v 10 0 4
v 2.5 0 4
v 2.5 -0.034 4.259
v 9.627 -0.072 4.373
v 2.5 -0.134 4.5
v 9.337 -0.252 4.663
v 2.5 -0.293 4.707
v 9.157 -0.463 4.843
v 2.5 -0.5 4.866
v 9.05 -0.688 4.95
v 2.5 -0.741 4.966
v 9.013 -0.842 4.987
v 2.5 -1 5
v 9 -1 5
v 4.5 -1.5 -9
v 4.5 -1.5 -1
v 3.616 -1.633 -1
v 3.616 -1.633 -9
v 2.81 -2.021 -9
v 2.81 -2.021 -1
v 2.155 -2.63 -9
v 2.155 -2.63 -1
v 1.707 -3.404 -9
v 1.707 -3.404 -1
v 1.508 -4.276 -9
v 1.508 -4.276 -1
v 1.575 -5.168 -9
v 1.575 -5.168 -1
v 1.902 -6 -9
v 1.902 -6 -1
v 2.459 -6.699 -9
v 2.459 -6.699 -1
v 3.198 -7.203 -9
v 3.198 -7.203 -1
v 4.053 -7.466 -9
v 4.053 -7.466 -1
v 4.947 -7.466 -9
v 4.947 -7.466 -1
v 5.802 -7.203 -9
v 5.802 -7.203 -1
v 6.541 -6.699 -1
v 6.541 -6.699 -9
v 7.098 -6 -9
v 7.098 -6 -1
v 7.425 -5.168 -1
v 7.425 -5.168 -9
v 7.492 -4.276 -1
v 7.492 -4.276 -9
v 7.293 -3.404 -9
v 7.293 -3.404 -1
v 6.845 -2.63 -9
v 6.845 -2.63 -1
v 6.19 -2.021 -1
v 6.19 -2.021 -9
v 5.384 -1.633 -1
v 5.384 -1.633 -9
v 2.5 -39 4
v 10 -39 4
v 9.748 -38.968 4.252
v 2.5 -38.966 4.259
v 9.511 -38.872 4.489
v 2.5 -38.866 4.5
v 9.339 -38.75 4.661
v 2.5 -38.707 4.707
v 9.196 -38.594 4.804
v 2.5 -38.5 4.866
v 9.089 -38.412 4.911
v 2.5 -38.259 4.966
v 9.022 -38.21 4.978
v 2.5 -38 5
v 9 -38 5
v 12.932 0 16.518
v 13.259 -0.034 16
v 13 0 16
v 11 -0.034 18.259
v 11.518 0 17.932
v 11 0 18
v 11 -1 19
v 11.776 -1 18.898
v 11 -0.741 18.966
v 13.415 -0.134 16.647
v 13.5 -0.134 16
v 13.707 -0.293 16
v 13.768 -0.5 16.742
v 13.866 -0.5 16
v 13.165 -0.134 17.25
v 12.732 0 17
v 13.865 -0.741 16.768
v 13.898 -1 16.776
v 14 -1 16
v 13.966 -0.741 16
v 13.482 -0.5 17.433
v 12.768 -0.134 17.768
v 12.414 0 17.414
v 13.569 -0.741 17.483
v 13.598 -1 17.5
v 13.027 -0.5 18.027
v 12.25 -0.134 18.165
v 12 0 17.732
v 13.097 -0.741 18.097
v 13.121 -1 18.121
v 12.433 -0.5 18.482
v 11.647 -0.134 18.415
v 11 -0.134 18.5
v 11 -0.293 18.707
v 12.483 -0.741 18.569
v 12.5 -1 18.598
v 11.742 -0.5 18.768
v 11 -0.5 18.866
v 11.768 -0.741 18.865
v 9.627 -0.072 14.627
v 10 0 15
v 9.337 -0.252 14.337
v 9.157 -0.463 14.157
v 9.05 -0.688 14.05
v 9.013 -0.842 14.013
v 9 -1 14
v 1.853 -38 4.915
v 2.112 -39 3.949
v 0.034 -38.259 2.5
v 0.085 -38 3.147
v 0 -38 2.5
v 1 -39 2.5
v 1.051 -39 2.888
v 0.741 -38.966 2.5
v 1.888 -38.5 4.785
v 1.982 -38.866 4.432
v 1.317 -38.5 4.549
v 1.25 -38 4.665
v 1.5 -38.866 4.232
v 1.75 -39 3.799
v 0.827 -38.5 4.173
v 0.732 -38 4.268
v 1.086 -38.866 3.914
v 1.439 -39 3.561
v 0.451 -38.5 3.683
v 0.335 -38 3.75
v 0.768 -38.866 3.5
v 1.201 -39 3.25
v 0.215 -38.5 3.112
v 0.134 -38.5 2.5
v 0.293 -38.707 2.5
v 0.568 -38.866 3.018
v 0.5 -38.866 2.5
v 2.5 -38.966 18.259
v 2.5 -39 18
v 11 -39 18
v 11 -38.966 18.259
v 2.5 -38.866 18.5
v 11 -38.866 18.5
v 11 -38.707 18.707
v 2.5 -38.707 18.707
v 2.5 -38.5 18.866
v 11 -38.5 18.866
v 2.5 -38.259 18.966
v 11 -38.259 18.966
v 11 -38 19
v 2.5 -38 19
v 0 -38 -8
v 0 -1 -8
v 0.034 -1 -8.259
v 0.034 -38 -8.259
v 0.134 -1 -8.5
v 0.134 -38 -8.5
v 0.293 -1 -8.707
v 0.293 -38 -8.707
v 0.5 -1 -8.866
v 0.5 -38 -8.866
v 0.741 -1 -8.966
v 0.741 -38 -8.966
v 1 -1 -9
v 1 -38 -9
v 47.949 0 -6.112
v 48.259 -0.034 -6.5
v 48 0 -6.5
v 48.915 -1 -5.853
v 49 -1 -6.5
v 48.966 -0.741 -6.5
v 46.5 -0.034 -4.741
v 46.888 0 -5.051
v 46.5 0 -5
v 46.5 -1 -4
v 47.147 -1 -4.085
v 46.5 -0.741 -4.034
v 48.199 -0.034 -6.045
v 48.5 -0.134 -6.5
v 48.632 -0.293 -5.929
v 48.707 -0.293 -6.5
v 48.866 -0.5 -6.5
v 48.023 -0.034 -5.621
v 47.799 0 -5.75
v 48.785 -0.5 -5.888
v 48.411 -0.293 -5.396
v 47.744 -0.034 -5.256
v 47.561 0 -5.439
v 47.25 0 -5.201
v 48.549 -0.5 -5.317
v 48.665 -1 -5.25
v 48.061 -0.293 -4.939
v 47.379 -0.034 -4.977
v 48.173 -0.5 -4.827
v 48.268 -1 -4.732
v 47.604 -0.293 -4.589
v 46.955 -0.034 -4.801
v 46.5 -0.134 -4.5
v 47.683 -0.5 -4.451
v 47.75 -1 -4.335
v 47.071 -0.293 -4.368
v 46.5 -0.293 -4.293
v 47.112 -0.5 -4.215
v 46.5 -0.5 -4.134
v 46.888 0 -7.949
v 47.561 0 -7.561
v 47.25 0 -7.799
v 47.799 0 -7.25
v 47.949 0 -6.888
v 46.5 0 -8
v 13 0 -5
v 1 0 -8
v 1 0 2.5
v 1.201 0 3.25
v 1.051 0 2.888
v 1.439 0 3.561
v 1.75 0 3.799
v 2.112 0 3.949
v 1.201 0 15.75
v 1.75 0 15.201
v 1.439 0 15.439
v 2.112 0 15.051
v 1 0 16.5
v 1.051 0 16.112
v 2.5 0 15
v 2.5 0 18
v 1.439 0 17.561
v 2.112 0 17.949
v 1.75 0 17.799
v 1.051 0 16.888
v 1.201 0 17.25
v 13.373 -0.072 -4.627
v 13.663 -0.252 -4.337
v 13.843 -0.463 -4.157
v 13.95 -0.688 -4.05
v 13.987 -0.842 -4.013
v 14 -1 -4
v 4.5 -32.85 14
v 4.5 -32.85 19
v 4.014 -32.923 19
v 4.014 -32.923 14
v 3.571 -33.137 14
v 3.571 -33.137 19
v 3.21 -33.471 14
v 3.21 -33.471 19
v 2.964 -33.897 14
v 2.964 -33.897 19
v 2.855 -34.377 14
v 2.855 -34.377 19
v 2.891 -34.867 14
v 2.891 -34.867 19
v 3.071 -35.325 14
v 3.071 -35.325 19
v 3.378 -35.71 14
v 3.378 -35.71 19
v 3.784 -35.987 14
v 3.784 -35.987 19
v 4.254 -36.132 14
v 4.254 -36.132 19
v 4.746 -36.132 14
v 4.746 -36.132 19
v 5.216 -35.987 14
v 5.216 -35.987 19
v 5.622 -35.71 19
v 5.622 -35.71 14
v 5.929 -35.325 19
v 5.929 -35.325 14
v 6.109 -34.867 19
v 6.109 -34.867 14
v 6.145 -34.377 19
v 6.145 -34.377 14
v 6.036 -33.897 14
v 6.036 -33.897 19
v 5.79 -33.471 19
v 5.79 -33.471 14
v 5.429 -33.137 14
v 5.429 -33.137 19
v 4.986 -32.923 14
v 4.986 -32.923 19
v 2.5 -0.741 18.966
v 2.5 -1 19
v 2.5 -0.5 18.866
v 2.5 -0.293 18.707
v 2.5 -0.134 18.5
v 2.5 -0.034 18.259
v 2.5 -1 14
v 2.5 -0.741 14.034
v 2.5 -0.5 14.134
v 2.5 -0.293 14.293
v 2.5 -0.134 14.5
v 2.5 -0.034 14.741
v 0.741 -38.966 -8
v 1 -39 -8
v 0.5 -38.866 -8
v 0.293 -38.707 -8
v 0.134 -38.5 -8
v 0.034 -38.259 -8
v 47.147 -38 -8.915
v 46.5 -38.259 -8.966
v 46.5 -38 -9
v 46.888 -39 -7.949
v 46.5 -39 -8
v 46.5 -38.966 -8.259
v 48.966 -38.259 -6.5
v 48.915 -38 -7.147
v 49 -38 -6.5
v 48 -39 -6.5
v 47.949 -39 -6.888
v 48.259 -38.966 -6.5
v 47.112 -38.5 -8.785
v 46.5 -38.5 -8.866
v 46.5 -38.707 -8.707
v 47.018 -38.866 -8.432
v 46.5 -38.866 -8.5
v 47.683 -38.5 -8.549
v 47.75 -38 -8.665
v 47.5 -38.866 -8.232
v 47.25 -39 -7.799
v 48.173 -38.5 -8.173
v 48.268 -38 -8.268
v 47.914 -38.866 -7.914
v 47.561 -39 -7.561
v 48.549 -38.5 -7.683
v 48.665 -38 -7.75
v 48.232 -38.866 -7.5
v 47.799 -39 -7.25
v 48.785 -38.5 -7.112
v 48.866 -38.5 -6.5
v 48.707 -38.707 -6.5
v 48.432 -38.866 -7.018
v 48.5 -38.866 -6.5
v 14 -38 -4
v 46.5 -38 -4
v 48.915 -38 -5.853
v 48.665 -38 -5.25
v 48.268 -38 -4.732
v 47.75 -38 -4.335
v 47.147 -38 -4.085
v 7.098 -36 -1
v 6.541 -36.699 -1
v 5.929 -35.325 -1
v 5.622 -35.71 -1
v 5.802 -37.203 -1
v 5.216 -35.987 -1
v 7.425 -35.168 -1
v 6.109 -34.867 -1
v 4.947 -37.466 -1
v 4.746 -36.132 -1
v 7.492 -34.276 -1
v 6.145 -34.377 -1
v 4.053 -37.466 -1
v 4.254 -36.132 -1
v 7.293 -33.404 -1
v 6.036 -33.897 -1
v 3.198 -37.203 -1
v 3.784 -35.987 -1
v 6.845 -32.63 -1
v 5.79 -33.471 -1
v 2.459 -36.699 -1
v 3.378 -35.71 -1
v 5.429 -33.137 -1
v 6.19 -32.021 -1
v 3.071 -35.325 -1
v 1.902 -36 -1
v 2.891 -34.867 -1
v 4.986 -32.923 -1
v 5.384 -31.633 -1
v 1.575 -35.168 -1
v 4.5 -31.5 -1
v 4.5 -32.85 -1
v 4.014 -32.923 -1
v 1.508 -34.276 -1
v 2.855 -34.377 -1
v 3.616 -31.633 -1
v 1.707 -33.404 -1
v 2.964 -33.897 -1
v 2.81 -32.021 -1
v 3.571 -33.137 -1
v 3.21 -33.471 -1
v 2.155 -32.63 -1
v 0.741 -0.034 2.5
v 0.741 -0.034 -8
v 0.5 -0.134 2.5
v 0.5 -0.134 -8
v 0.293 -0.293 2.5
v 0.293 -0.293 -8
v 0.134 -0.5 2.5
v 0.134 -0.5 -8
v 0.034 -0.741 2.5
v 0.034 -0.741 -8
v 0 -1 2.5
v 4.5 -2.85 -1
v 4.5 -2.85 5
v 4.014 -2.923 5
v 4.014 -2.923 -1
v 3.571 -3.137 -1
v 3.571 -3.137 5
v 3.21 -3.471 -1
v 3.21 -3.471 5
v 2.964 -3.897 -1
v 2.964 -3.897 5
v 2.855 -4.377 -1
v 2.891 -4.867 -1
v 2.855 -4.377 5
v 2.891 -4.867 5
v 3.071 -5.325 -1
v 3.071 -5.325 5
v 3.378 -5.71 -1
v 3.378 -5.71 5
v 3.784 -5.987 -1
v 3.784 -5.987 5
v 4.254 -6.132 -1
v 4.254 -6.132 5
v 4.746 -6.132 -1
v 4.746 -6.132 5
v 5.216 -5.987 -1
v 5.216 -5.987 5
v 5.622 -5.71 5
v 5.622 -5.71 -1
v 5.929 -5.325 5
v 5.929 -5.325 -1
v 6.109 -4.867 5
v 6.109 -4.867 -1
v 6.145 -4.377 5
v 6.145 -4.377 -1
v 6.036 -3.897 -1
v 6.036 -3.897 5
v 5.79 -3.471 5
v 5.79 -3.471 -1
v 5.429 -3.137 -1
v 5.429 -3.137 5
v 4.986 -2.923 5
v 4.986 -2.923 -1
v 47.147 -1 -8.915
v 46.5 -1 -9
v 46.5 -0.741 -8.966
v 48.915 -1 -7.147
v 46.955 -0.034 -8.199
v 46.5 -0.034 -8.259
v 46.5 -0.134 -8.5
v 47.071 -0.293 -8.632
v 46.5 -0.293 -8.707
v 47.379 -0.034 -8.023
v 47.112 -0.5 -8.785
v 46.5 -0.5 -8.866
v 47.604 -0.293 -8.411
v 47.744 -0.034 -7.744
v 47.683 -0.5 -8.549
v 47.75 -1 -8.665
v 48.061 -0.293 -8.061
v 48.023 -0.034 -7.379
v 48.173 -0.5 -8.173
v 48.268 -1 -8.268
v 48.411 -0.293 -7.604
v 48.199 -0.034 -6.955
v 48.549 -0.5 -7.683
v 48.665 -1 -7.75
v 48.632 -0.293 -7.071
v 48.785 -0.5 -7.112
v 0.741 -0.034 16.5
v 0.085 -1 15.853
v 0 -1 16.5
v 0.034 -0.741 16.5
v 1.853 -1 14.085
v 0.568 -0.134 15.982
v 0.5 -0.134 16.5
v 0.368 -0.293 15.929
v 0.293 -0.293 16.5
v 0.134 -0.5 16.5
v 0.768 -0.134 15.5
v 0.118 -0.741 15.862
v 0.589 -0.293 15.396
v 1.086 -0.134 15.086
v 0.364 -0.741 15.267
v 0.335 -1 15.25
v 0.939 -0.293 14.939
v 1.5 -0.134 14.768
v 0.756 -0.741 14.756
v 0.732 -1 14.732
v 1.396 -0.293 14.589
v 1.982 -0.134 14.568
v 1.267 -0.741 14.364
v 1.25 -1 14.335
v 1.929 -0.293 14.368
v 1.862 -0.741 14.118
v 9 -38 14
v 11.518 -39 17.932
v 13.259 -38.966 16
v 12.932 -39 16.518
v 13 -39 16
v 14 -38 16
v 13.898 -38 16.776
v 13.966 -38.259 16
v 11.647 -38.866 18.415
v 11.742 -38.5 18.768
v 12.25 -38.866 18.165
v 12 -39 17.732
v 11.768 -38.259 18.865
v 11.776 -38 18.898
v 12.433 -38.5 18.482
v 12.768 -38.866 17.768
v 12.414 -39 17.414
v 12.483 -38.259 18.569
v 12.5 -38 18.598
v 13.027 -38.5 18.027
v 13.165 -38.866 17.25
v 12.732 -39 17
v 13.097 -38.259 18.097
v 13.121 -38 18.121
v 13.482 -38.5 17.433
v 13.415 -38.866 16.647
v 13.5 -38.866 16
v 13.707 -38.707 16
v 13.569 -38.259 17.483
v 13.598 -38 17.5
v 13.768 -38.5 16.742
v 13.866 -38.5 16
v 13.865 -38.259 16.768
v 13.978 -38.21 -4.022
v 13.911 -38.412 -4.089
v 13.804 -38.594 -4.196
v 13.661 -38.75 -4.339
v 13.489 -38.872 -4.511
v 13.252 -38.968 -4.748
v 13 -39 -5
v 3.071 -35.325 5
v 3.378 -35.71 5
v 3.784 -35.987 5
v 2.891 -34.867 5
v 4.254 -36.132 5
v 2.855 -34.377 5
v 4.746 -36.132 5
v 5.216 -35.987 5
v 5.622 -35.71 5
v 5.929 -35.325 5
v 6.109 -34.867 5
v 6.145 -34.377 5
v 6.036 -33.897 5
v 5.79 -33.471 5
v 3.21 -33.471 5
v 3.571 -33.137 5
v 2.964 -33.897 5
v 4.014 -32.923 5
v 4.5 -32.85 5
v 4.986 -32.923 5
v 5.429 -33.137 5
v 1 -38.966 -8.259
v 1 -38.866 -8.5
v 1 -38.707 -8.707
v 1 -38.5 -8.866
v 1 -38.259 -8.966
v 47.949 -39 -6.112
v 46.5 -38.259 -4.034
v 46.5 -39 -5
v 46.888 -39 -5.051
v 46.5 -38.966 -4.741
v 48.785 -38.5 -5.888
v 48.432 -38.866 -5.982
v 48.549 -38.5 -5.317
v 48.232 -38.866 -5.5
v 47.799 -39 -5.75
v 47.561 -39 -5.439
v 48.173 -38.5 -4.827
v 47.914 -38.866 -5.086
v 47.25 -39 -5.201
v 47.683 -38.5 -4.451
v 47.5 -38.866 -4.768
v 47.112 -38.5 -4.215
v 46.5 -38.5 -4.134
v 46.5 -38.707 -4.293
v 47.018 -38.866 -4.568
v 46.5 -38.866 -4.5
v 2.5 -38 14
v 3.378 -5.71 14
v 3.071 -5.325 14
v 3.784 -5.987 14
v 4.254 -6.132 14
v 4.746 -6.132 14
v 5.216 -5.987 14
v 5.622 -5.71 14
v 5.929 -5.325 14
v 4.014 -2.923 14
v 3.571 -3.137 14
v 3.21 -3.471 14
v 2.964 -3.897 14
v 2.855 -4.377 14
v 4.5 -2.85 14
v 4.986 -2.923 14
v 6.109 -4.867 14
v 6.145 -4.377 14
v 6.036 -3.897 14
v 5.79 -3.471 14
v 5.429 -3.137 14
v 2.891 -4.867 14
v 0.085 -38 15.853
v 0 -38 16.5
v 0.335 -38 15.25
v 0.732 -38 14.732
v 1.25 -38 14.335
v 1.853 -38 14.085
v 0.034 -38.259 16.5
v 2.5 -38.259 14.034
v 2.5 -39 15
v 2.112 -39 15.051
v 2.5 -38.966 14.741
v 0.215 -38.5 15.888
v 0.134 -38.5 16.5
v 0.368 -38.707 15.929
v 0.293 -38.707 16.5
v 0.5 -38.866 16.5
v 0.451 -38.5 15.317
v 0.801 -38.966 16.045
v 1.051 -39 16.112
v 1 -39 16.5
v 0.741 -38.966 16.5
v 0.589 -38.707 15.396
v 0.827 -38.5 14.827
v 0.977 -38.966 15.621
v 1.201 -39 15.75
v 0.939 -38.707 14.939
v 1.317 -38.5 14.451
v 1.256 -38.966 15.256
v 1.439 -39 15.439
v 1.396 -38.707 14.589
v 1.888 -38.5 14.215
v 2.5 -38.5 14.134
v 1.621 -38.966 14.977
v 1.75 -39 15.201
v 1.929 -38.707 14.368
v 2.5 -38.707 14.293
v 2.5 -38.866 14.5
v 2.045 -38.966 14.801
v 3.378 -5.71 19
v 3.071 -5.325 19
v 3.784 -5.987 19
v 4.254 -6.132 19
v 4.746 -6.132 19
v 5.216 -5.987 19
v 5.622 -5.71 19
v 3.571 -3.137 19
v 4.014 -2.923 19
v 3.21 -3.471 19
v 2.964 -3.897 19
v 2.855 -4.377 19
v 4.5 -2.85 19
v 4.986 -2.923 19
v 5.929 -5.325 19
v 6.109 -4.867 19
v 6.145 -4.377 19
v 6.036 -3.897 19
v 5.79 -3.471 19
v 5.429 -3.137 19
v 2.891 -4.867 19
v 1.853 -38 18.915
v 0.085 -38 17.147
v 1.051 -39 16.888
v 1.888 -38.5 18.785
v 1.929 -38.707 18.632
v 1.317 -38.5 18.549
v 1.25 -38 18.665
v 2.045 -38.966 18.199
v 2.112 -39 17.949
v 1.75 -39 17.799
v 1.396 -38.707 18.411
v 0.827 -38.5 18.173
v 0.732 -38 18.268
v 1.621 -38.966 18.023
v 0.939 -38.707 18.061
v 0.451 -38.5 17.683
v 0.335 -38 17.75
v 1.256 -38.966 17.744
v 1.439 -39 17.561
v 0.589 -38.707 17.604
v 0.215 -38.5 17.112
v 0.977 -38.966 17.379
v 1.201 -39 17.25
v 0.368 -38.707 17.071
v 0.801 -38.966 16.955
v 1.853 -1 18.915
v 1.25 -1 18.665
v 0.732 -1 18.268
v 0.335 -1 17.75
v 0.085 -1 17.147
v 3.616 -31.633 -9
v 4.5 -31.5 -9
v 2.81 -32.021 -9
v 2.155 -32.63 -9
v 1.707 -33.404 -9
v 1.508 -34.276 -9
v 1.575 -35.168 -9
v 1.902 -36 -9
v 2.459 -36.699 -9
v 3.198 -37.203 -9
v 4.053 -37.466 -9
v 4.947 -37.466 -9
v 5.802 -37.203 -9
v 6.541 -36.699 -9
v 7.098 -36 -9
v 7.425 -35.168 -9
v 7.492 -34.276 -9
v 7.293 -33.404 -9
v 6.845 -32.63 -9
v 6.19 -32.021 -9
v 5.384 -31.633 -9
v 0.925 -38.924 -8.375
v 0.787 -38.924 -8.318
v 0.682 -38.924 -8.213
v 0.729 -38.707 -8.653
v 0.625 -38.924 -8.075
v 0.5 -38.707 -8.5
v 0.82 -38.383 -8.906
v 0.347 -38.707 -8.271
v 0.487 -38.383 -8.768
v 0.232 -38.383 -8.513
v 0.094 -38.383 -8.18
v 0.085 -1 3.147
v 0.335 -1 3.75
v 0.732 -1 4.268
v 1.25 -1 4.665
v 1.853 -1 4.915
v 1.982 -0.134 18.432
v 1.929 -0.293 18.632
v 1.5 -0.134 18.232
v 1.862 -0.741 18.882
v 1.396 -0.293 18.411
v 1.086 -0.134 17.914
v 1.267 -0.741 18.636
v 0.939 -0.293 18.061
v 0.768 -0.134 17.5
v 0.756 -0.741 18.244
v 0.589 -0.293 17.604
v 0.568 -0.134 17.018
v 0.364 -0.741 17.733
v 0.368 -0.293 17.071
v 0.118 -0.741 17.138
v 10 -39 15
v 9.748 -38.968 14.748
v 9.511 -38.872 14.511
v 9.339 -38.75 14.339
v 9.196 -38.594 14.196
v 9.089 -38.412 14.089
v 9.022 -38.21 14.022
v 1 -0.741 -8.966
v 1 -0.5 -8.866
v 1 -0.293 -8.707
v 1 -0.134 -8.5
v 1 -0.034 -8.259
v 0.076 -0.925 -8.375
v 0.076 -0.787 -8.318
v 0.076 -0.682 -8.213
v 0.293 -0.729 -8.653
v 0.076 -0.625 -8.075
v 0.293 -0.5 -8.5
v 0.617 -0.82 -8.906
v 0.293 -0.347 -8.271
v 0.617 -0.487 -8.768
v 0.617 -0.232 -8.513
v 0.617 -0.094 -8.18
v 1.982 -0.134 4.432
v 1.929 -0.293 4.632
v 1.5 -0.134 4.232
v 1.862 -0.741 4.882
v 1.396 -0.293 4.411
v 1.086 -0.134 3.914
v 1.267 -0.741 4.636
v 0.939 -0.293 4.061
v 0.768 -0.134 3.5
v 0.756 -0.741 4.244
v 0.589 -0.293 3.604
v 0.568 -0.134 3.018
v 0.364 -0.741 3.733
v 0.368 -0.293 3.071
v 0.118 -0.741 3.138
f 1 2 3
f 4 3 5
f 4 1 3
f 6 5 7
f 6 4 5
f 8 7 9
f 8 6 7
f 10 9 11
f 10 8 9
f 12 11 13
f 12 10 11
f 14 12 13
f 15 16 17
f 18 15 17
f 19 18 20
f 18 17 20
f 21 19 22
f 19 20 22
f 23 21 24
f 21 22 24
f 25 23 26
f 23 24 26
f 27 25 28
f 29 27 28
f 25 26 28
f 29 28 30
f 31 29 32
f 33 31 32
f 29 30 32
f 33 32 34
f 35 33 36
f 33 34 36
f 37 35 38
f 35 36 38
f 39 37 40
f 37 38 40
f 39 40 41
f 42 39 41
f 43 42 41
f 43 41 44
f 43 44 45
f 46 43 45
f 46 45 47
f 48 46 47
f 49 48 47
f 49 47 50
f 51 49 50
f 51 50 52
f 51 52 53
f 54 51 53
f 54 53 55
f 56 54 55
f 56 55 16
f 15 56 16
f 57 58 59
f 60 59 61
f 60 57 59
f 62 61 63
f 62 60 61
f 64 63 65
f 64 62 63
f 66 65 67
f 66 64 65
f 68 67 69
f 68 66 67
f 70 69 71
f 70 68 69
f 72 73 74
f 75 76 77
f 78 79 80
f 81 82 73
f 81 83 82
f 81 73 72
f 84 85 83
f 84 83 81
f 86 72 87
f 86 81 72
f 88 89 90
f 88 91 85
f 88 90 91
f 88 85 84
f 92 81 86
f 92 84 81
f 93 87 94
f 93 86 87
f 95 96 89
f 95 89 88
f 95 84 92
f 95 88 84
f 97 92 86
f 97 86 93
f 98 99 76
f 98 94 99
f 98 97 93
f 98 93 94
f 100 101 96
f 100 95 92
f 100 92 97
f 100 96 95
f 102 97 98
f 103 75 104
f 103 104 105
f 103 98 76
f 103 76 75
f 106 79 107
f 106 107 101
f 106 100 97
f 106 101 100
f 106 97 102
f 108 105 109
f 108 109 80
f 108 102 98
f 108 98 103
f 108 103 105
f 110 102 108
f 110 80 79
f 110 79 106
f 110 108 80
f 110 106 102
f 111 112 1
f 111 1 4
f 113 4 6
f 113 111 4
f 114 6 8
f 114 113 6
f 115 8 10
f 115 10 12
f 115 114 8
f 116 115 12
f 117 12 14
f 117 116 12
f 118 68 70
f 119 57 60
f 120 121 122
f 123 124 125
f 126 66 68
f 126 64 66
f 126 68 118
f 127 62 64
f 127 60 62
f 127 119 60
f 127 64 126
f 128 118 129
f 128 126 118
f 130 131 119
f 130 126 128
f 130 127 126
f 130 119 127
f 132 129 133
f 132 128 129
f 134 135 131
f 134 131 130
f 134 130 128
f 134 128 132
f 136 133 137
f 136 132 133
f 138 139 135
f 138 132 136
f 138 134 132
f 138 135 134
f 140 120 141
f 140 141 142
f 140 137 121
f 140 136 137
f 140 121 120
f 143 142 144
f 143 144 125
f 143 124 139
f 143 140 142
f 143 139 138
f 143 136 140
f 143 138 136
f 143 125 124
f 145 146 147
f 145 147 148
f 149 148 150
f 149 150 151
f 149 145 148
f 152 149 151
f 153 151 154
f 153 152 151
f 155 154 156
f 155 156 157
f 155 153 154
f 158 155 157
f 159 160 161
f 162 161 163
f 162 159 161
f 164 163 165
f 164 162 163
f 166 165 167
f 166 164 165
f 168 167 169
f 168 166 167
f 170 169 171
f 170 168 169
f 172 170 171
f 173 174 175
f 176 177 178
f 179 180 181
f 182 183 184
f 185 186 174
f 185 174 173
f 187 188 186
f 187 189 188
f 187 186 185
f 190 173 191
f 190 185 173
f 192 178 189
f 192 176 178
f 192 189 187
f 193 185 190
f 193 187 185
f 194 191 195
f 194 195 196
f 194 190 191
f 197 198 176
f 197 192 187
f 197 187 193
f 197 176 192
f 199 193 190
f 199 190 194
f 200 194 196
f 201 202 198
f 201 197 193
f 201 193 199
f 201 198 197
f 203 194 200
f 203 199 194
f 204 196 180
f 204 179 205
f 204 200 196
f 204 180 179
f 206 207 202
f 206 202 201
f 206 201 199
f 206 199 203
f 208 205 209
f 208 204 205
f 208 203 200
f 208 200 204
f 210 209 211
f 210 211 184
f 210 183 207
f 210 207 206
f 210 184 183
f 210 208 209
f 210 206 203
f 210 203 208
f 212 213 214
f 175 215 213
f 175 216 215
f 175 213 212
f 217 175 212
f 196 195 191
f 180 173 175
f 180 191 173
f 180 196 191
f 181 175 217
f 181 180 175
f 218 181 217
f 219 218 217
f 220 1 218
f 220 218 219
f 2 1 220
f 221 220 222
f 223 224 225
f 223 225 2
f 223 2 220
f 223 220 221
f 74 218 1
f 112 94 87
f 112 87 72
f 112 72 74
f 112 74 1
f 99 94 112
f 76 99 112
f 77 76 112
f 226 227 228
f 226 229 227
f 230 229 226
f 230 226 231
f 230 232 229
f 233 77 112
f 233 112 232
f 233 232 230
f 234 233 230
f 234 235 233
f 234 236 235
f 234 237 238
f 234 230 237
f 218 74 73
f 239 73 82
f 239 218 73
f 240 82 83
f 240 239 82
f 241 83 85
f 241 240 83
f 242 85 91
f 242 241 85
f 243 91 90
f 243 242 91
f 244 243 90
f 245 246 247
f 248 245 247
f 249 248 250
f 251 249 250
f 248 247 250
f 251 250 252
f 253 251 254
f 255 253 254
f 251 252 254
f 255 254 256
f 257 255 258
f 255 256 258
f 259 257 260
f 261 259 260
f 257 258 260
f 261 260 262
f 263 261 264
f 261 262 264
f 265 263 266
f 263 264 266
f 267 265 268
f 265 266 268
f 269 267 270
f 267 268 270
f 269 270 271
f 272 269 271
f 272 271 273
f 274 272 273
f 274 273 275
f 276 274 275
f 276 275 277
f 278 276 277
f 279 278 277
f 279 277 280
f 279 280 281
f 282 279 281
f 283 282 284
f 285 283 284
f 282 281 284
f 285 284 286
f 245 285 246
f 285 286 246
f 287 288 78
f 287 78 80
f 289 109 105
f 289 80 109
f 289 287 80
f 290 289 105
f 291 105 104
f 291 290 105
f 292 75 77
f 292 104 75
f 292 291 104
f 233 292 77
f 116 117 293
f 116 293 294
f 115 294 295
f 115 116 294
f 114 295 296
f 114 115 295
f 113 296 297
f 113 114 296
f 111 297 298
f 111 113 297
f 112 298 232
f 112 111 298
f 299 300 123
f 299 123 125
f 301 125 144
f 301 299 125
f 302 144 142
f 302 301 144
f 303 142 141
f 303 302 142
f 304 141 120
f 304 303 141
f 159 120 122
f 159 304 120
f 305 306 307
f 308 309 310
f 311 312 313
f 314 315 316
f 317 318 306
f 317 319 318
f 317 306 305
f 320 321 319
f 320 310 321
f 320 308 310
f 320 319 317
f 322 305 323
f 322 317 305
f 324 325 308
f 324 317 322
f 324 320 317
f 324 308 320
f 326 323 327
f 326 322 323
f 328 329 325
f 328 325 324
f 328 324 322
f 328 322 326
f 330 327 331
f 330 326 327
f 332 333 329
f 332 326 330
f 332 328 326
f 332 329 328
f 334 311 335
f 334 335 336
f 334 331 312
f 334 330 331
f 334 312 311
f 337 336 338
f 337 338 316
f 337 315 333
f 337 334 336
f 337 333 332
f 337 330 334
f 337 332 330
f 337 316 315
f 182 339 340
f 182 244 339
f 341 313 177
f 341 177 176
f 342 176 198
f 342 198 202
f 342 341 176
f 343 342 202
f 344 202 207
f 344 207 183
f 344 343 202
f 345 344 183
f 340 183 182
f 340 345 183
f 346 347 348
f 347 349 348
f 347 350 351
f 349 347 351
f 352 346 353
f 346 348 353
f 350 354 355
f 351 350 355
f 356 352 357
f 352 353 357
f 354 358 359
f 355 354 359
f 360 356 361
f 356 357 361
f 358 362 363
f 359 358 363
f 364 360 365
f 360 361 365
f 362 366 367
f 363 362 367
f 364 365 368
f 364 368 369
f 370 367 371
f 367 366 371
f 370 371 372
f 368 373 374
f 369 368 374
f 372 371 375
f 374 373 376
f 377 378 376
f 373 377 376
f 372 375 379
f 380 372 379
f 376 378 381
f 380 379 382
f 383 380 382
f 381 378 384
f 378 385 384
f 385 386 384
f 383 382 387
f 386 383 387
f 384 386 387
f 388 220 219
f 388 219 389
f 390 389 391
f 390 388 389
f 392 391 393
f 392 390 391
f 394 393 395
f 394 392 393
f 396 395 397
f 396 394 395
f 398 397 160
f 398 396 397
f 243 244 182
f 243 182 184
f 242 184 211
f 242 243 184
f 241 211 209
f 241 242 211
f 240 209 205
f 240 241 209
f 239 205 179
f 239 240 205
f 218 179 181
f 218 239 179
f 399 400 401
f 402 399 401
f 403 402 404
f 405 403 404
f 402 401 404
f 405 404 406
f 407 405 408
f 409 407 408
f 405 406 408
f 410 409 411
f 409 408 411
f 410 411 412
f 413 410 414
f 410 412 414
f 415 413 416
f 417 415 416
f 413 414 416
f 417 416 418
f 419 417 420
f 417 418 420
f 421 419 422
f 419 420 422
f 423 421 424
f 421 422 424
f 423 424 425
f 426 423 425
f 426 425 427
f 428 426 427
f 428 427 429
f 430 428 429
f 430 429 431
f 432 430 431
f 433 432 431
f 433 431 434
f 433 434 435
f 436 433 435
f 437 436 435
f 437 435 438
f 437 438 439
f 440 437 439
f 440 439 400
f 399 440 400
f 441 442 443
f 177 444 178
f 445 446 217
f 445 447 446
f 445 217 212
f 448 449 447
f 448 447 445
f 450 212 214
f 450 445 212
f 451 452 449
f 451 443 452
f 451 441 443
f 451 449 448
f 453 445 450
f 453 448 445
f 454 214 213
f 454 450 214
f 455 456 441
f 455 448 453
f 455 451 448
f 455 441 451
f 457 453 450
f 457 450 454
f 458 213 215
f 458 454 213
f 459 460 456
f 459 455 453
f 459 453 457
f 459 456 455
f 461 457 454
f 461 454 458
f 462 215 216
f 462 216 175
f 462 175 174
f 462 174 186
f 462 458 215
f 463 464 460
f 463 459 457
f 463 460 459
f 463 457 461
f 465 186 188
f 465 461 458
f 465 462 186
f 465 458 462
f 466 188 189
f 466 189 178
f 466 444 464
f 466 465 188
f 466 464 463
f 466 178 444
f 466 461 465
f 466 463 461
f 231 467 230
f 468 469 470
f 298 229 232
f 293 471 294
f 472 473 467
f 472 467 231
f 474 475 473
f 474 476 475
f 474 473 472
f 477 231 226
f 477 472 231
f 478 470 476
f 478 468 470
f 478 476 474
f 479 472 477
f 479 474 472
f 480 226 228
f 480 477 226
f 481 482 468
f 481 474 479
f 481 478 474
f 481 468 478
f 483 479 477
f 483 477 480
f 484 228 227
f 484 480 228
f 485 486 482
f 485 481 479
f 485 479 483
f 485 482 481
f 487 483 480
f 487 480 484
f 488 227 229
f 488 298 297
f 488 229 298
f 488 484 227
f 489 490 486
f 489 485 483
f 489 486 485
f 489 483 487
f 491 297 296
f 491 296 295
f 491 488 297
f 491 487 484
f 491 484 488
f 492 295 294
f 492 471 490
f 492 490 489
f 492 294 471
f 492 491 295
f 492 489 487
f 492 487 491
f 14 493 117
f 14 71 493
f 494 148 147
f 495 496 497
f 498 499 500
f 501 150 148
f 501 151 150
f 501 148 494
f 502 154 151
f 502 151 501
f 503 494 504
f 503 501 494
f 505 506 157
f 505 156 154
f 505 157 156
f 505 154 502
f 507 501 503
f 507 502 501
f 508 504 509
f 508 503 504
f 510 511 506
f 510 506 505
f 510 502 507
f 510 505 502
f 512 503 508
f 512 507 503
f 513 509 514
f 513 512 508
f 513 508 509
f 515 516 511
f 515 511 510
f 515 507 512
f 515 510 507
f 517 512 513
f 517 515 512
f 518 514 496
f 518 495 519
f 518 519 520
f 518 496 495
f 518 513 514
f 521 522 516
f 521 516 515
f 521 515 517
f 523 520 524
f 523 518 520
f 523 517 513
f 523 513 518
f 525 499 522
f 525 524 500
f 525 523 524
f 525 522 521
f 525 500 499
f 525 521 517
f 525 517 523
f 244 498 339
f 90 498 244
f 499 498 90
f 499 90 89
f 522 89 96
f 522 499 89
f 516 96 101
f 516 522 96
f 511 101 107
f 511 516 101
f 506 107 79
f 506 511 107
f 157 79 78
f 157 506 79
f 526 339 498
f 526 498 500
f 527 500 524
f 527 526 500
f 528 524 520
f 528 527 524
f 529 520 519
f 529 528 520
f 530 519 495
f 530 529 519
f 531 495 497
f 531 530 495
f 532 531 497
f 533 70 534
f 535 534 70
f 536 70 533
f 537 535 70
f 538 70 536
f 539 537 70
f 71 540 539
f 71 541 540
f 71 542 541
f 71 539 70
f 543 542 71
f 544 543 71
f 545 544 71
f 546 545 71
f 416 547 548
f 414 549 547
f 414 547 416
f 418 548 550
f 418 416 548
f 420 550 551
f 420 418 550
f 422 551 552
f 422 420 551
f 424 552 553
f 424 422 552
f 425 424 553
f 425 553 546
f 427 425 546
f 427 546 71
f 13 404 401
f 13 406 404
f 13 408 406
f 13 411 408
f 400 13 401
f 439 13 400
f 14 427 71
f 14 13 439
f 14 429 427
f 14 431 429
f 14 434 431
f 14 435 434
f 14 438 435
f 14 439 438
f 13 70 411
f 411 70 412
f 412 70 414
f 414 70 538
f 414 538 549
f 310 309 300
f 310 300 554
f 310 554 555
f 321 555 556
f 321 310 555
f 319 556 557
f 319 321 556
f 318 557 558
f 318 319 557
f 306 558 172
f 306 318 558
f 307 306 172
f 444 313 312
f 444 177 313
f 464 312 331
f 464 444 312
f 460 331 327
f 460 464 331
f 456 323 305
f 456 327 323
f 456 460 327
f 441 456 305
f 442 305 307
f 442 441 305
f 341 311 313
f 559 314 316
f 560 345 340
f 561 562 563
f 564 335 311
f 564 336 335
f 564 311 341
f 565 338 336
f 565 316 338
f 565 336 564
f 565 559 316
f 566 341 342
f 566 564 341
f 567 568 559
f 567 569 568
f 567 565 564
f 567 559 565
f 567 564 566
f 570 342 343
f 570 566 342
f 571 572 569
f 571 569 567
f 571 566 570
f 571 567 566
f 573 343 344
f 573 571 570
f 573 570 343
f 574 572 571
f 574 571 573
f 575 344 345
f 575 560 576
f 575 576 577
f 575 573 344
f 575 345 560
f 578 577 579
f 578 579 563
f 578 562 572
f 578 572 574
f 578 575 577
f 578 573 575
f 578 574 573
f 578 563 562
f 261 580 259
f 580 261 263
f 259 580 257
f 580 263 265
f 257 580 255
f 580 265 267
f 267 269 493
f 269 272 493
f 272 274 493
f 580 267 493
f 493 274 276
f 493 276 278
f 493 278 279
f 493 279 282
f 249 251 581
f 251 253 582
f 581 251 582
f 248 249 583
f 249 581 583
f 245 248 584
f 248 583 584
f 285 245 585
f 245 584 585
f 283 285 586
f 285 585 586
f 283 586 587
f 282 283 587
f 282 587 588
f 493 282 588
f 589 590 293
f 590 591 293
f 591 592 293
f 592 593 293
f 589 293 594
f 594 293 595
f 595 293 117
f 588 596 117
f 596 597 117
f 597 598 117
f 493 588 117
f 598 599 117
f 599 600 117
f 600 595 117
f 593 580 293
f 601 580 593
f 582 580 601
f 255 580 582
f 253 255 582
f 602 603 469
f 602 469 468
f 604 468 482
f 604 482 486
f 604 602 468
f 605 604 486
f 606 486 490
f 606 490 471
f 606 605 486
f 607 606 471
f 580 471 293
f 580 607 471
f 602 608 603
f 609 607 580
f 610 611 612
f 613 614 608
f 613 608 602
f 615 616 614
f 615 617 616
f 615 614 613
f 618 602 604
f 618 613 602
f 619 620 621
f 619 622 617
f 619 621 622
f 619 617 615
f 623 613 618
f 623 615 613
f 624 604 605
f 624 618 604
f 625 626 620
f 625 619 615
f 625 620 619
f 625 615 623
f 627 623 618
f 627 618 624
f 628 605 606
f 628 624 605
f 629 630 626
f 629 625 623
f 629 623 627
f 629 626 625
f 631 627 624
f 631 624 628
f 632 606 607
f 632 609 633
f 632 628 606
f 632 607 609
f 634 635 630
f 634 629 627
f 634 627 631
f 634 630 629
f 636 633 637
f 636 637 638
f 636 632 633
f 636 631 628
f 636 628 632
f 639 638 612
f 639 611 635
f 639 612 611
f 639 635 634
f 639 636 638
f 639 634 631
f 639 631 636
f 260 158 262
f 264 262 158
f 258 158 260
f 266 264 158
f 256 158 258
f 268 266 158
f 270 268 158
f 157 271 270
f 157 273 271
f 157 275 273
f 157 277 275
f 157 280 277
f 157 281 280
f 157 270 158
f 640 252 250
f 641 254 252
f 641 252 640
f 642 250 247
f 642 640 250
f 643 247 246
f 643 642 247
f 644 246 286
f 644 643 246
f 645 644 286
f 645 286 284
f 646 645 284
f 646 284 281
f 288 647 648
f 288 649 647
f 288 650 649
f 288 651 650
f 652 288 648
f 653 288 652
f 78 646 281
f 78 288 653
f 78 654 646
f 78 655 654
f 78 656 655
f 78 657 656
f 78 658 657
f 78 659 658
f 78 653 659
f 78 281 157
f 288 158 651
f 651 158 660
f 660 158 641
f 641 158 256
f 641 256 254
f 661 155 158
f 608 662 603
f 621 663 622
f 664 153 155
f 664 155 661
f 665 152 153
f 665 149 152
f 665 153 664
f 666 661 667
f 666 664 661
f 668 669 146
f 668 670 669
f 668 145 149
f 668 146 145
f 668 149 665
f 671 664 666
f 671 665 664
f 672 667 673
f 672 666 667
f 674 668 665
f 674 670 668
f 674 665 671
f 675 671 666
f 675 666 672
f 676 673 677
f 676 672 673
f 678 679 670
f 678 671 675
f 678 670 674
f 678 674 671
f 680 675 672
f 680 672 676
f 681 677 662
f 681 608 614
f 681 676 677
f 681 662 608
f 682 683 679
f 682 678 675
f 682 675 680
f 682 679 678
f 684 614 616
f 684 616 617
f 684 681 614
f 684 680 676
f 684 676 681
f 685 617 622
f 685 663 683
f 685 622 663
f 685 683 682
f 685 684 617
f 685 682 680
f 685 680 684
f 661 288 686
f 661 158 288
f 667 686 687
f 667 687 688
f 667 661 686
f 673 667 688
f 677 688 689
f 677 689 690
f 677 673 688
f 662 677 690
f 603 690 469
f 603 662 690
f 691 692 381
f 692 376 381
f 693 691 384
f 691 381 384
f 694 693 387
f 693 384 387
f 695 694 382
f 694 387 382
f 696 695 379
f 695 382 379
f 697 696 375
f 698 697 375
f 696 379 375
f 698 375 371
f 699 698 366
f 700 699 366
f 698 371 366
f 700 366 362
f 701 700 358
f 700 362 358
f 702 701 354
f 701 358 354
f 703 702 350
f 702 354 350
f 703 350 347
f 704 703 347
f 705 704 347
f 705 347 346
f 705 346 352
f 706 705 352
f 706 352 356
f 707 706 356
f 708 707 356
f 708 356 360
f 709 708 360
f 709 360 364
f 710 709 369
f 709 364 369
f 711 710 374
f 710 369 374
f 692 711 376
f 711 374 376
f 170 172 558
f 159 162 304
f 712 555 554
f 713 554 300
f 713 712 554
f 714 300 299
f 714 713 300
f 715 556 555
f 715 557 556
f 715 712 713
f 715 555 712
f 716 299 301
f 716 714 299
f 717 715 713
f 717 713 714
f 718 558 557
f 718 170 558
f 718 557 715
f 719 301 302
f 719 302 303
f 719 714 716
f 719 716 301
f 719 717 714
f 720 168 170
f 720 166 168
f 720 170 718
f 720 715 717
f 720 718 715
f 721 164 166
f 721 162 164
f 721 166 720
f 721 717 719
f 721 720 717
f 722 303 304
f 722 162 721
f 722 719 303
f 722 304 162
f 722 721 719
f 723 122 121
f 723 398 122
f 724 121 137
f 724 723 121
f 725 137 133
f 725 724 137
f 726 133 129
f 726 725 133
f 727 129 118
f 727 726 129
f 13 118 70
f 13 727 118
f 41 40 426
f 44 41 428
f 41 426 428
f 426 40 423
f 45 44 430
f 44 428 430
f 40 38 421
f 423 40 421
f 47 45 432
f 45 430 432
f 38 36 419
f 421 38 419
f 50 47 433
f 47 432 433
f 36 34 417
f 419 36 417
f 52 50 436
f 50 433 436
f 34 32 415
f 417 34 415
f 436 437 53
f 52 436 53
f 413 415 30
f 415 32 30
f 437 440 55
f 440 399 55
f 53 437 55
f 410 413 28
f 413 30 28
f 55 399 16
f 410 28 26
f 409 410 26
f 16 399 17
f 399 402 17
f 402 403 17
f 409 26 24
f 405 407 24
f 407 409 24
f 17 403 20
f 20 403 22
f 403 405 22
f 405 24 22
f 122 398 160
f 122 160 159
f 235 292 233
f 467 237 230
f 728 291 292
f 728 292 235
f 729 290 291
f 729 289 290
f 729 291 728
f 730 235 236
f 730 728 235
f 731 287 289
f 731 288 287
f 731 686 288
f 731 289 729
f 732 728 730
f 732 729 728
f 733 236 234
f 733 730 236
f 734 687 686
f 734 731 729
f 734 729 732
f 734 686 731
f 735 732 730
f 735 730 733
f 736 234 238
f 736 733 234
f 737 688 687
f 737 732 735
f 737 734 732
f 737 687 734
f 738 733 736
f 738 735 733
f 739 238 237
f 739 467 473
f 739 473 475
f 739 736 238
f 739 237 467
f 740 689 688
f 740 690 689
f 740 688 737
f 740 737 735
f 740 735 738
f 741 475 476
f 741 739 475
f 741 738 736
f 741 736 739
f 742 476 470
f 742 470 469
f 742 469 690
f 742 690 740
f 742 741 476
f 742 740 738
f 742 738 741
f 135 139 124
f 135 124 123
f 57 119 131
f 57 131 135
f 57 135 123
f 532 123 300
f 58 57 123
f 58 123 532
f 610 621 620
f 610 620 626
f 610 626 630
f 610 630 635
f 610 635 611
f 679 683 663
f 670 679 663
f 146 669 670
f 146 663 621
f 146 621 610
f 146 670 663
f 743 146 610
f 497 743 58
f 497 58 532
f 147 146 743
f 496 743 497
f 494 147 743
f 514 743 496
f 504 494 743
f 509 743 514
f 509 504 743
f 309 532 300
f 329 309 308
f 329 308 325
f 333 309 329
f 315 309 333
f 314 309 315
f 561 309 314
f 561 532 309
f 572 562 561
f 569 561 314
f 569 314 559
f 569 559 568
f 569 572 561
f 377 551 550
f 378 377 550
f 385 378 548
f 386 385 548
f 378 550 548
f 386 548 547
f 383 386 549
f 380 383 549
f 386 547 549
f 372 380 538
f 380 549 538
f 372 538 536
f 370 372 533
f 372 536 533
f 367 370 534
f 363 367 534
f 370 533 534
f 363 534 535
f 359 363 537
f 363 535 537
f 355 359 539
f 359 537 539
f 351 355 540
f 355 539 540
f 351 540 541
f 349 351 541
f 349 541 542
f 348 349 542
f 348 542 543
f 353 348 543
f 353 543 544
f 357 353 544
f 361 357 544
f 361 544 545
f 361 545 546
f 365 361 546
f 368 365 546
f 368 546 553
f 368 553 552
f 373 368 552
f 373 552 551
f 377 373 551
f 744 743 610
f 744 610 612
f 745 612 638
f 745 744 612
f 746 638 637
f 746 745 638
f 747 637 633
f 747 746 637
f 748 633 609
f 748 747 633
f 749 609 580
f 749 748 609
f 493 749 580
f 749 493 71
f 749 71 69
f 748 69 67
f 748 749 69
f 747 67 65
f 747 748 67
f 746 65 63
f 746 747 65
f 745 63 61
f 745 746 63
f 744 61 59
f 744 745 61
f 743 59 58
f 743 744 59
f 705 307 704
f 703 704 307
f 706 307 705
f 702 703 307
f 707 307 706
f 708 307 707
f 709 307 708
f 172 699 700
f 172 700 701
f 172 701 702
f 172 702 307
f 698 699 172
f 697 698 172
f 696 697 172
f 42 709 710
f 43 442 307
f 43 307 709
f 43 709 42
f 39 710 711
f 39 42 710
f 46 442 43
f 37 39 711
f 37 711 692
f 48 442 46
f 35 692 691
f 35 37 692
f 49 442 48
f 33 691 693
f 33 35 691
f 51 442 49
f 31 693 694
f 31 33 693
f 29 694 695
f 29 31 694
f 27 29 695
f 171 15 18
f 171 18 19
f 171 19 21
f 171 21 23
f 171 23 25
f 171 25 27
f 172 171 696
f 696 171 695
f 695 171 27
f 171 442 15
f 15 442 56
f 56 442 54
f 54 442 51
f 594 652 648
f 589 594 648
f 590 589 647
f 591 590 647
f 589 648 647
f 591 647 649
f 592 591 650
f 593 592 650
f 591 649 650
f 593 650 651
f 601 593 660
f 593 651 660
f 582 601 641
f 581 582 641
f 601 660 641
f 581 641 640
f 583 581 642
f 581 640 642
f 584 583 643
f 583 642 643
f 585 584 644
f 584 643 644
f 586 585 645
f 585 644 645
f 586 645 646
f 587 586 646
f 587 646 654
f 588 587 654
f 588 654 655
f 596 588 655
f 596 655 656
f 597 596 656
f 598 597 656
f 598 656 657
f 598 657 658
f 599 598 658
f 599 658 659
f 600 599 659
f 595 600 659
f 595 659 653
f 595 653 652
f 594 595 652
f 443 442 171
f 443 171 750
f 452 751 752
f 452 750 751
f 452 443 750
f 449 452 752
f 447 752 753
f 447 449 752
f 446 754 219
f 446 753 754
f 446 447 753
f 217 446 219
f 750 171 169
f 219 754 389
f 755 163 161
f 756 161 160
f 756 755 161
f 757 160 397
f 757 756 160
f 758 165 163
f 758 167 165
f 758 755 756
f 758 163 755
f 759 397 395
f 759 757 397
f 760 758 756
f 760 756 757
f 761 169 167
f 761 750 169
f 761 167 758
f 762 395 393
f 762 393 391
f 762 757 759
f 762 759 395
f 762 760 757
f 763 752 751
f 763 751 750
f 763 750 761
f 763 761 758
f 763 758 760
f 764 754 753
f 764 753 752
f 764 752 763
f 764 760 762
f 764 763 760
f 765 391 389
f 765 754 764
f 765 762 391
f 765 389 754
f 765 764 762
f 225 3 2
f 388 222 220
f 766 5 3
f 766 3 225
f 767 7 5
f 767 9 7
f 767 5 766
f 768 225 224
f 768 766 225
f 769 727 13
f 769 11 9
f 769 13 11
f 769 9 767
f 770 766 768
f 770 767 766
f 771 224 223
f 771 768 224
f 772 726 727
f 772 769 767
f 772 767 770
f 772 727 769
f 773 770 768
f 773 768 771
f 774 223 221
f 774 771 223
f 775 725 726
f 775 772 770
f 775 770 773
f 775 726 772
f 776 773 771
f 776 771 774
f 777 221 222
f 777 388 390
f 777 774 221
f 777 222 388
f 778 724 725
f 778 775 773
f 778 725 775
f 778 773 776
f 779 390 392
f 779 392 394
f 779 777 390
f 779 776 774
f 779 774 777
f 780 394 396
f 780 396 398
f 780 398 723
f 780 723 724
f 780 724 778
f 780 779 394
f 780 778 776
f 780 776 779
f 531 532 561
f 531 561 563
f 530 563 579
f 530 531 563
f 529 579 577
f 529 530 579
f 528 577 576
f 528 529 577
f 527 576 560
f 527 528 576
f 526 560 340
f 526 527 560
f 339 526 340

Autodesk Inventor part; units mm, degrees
ref_plane "YZ Plane" through (0, 0, 0) normal (1, 0, 0) x (0, 1, 0)
ref_plane "XZ Plane" through (0, 0, 0) normal (0, 1, 0) x (-1, 0, 0)
ref_plane "XY Plane" through (0, 0, 0) normal (0, 0, 1) x (1, 0, 0)
sketch "スケッチ1" plane through (0, 0, 0) normal (0, 0, 1) x (1, 0, 0)
  line L0 (0, 0) -> (49, 0)
  line L1 (49, 0) -> (49, -39)
  line L2 (49, -39) -> (0, -39)
  line L3 (0, -39) -> (0, 0)
  dimension "d2" = 39
  dimension "d3" = 49
extrude "押し出し1" add sketch "スケッチ1" along normal blind 5
sketch "スケッチ2" plane through (0, 0, 5) normal (0, 0, 1) x (1, 0, 0)
  line L0 (49, 0) -> (0, 0) projected
  line L1 (9, 0) -> (14, 0)
  line L2 (14, 0) -> (14, -39)
  line L3 (14, -39) -> (9, -39)
  line L4 (9, -39) -> (9, 0)
  line L5 (0, 0) -> (0, -39) projected
  dimension "d4" = 5
  dimension "d5" = 39
  dimension "d6" = 9
extrude "押し出し2" add sketch "スケッチ2" along normal blind 9
sketch "スケッチ3" plane through (0, 0, 14) normal (0, 0, 1) x (1, 0, 0)
  line L0 (0, -39) -> (9, -39) projected
  line L1 (14, 0) -> (0, 0)
  line L2 (0, 0) -> (0, -39)
  line L3 (0, -39) -> (14, -39)
  line L4 (14, -39) -> (14, 0)
  point P0 (0, 0)
extrude "押し出し3" add sketch "スケッチ3" along normal blind 5
sketch "スケッチ4" plane through (0, 0, 0) normal (0, 0, -1) x (-1, 0, 0)
  line L0 (-49, 0) -> (-14, 0) projected
  line L1 (0, -39) -> (-49, -39) projected
  line L2 (-49, 0) -> (0, 0)
  line L3 (0, 0) -> (0, -39)
  line L4 (0, -39) -> (-49, -39)
  line L5 (-49, -39) -> (-49, 0)
  point P0 (0, 0)
extrude "押し出し4" add sketch "スケッチ4" along normal blind 9
sketch "スケッチ5" plane through (0, 0, 5) normal (0, 0, 1) x (1, 0, 0)
  line L0 (49, 0) -> (14, 0) projected
  line L1 (14, 0) -> (49, 0)
  line L2 (49, 0) -> (49, -39)
  line L3 (49, -39) -> (14, -39)
  line L4 (14, -39) -> (14, 0)
  point P0 (0, 0)
extrude "押し出し5" cut sketch "スケッチ5" against normal blind 9
fillet "フィレット1" radius 2.5 2 edges at (49, -19.5, -4) (49, -19.5, -9)
fillet "フィレット2" radius 2.5 3 edges at (0, -19.5, 19) (0, -19.5, 14) (0, -19.5, 5)
sketch "スケッチ6" plane through (0, 0, -9) normal (0, 0, -1) x (-1, 0, 0)
  line L0 (0, 0) -> (-46.5, 0) projected
  line L1 (-46.5, -39) -> (0, -39) projected
  line L2 (0, -39) -> (0, 0) projected
  point P0 (-4.5, -4.5)
  point P1 (-4.5, -34.5)
  dimension "d17" = 4.5
  dimension "d18" = 4.5
  dimension "d19" = 4.5
  dimension "d20" = 4.5
hole "穴1" at (4.5, -4.5, -9) at (4.5, -34.5, -9) direction (0, 0, 1) diameter 3.3 end through all counterbore diameter 6 counterbore depth 8
fillet "フィレット5" radius 1 23 edges at (48.2678, 0, -4.7322) (30.2501, 0, -4) (23.25, 0, -9) (0.7322, 0, 4.2678) (5.7499, 0, 5) (0, 0, -3.2499) (9, 0, 9.5) (14, 0, 7.5) (0.7322, 0, 18.2678) (5.75, 0, 14) (8.25, 0, 19) (0, -19.5, -9) (48.2678, -39, -4.7322) (30.2501, -39, -4) (23.2501, -39, -9) (9, -39, 9.5) (0.7322, -39, 18.2678) (8.25, -39, 19) (5.75, -39, 14) (5.75, -39, 5) (0, -39, -3.25) (0.7322, -39, 4.2678) (14, -39, 7.5)
fillet "フィレット6" radius 3 3 edges at (13.7071, -0.2929, 18.7071) (13.7071, -38.7071, 18.7071) (14, -19.5, 19)
equation "\"d18\" = d17"
equation "\"d19\" = d18"
equation "\"d20\" = d17"
properties part number "ハンド3D_L" material "ABS プラスチック"
